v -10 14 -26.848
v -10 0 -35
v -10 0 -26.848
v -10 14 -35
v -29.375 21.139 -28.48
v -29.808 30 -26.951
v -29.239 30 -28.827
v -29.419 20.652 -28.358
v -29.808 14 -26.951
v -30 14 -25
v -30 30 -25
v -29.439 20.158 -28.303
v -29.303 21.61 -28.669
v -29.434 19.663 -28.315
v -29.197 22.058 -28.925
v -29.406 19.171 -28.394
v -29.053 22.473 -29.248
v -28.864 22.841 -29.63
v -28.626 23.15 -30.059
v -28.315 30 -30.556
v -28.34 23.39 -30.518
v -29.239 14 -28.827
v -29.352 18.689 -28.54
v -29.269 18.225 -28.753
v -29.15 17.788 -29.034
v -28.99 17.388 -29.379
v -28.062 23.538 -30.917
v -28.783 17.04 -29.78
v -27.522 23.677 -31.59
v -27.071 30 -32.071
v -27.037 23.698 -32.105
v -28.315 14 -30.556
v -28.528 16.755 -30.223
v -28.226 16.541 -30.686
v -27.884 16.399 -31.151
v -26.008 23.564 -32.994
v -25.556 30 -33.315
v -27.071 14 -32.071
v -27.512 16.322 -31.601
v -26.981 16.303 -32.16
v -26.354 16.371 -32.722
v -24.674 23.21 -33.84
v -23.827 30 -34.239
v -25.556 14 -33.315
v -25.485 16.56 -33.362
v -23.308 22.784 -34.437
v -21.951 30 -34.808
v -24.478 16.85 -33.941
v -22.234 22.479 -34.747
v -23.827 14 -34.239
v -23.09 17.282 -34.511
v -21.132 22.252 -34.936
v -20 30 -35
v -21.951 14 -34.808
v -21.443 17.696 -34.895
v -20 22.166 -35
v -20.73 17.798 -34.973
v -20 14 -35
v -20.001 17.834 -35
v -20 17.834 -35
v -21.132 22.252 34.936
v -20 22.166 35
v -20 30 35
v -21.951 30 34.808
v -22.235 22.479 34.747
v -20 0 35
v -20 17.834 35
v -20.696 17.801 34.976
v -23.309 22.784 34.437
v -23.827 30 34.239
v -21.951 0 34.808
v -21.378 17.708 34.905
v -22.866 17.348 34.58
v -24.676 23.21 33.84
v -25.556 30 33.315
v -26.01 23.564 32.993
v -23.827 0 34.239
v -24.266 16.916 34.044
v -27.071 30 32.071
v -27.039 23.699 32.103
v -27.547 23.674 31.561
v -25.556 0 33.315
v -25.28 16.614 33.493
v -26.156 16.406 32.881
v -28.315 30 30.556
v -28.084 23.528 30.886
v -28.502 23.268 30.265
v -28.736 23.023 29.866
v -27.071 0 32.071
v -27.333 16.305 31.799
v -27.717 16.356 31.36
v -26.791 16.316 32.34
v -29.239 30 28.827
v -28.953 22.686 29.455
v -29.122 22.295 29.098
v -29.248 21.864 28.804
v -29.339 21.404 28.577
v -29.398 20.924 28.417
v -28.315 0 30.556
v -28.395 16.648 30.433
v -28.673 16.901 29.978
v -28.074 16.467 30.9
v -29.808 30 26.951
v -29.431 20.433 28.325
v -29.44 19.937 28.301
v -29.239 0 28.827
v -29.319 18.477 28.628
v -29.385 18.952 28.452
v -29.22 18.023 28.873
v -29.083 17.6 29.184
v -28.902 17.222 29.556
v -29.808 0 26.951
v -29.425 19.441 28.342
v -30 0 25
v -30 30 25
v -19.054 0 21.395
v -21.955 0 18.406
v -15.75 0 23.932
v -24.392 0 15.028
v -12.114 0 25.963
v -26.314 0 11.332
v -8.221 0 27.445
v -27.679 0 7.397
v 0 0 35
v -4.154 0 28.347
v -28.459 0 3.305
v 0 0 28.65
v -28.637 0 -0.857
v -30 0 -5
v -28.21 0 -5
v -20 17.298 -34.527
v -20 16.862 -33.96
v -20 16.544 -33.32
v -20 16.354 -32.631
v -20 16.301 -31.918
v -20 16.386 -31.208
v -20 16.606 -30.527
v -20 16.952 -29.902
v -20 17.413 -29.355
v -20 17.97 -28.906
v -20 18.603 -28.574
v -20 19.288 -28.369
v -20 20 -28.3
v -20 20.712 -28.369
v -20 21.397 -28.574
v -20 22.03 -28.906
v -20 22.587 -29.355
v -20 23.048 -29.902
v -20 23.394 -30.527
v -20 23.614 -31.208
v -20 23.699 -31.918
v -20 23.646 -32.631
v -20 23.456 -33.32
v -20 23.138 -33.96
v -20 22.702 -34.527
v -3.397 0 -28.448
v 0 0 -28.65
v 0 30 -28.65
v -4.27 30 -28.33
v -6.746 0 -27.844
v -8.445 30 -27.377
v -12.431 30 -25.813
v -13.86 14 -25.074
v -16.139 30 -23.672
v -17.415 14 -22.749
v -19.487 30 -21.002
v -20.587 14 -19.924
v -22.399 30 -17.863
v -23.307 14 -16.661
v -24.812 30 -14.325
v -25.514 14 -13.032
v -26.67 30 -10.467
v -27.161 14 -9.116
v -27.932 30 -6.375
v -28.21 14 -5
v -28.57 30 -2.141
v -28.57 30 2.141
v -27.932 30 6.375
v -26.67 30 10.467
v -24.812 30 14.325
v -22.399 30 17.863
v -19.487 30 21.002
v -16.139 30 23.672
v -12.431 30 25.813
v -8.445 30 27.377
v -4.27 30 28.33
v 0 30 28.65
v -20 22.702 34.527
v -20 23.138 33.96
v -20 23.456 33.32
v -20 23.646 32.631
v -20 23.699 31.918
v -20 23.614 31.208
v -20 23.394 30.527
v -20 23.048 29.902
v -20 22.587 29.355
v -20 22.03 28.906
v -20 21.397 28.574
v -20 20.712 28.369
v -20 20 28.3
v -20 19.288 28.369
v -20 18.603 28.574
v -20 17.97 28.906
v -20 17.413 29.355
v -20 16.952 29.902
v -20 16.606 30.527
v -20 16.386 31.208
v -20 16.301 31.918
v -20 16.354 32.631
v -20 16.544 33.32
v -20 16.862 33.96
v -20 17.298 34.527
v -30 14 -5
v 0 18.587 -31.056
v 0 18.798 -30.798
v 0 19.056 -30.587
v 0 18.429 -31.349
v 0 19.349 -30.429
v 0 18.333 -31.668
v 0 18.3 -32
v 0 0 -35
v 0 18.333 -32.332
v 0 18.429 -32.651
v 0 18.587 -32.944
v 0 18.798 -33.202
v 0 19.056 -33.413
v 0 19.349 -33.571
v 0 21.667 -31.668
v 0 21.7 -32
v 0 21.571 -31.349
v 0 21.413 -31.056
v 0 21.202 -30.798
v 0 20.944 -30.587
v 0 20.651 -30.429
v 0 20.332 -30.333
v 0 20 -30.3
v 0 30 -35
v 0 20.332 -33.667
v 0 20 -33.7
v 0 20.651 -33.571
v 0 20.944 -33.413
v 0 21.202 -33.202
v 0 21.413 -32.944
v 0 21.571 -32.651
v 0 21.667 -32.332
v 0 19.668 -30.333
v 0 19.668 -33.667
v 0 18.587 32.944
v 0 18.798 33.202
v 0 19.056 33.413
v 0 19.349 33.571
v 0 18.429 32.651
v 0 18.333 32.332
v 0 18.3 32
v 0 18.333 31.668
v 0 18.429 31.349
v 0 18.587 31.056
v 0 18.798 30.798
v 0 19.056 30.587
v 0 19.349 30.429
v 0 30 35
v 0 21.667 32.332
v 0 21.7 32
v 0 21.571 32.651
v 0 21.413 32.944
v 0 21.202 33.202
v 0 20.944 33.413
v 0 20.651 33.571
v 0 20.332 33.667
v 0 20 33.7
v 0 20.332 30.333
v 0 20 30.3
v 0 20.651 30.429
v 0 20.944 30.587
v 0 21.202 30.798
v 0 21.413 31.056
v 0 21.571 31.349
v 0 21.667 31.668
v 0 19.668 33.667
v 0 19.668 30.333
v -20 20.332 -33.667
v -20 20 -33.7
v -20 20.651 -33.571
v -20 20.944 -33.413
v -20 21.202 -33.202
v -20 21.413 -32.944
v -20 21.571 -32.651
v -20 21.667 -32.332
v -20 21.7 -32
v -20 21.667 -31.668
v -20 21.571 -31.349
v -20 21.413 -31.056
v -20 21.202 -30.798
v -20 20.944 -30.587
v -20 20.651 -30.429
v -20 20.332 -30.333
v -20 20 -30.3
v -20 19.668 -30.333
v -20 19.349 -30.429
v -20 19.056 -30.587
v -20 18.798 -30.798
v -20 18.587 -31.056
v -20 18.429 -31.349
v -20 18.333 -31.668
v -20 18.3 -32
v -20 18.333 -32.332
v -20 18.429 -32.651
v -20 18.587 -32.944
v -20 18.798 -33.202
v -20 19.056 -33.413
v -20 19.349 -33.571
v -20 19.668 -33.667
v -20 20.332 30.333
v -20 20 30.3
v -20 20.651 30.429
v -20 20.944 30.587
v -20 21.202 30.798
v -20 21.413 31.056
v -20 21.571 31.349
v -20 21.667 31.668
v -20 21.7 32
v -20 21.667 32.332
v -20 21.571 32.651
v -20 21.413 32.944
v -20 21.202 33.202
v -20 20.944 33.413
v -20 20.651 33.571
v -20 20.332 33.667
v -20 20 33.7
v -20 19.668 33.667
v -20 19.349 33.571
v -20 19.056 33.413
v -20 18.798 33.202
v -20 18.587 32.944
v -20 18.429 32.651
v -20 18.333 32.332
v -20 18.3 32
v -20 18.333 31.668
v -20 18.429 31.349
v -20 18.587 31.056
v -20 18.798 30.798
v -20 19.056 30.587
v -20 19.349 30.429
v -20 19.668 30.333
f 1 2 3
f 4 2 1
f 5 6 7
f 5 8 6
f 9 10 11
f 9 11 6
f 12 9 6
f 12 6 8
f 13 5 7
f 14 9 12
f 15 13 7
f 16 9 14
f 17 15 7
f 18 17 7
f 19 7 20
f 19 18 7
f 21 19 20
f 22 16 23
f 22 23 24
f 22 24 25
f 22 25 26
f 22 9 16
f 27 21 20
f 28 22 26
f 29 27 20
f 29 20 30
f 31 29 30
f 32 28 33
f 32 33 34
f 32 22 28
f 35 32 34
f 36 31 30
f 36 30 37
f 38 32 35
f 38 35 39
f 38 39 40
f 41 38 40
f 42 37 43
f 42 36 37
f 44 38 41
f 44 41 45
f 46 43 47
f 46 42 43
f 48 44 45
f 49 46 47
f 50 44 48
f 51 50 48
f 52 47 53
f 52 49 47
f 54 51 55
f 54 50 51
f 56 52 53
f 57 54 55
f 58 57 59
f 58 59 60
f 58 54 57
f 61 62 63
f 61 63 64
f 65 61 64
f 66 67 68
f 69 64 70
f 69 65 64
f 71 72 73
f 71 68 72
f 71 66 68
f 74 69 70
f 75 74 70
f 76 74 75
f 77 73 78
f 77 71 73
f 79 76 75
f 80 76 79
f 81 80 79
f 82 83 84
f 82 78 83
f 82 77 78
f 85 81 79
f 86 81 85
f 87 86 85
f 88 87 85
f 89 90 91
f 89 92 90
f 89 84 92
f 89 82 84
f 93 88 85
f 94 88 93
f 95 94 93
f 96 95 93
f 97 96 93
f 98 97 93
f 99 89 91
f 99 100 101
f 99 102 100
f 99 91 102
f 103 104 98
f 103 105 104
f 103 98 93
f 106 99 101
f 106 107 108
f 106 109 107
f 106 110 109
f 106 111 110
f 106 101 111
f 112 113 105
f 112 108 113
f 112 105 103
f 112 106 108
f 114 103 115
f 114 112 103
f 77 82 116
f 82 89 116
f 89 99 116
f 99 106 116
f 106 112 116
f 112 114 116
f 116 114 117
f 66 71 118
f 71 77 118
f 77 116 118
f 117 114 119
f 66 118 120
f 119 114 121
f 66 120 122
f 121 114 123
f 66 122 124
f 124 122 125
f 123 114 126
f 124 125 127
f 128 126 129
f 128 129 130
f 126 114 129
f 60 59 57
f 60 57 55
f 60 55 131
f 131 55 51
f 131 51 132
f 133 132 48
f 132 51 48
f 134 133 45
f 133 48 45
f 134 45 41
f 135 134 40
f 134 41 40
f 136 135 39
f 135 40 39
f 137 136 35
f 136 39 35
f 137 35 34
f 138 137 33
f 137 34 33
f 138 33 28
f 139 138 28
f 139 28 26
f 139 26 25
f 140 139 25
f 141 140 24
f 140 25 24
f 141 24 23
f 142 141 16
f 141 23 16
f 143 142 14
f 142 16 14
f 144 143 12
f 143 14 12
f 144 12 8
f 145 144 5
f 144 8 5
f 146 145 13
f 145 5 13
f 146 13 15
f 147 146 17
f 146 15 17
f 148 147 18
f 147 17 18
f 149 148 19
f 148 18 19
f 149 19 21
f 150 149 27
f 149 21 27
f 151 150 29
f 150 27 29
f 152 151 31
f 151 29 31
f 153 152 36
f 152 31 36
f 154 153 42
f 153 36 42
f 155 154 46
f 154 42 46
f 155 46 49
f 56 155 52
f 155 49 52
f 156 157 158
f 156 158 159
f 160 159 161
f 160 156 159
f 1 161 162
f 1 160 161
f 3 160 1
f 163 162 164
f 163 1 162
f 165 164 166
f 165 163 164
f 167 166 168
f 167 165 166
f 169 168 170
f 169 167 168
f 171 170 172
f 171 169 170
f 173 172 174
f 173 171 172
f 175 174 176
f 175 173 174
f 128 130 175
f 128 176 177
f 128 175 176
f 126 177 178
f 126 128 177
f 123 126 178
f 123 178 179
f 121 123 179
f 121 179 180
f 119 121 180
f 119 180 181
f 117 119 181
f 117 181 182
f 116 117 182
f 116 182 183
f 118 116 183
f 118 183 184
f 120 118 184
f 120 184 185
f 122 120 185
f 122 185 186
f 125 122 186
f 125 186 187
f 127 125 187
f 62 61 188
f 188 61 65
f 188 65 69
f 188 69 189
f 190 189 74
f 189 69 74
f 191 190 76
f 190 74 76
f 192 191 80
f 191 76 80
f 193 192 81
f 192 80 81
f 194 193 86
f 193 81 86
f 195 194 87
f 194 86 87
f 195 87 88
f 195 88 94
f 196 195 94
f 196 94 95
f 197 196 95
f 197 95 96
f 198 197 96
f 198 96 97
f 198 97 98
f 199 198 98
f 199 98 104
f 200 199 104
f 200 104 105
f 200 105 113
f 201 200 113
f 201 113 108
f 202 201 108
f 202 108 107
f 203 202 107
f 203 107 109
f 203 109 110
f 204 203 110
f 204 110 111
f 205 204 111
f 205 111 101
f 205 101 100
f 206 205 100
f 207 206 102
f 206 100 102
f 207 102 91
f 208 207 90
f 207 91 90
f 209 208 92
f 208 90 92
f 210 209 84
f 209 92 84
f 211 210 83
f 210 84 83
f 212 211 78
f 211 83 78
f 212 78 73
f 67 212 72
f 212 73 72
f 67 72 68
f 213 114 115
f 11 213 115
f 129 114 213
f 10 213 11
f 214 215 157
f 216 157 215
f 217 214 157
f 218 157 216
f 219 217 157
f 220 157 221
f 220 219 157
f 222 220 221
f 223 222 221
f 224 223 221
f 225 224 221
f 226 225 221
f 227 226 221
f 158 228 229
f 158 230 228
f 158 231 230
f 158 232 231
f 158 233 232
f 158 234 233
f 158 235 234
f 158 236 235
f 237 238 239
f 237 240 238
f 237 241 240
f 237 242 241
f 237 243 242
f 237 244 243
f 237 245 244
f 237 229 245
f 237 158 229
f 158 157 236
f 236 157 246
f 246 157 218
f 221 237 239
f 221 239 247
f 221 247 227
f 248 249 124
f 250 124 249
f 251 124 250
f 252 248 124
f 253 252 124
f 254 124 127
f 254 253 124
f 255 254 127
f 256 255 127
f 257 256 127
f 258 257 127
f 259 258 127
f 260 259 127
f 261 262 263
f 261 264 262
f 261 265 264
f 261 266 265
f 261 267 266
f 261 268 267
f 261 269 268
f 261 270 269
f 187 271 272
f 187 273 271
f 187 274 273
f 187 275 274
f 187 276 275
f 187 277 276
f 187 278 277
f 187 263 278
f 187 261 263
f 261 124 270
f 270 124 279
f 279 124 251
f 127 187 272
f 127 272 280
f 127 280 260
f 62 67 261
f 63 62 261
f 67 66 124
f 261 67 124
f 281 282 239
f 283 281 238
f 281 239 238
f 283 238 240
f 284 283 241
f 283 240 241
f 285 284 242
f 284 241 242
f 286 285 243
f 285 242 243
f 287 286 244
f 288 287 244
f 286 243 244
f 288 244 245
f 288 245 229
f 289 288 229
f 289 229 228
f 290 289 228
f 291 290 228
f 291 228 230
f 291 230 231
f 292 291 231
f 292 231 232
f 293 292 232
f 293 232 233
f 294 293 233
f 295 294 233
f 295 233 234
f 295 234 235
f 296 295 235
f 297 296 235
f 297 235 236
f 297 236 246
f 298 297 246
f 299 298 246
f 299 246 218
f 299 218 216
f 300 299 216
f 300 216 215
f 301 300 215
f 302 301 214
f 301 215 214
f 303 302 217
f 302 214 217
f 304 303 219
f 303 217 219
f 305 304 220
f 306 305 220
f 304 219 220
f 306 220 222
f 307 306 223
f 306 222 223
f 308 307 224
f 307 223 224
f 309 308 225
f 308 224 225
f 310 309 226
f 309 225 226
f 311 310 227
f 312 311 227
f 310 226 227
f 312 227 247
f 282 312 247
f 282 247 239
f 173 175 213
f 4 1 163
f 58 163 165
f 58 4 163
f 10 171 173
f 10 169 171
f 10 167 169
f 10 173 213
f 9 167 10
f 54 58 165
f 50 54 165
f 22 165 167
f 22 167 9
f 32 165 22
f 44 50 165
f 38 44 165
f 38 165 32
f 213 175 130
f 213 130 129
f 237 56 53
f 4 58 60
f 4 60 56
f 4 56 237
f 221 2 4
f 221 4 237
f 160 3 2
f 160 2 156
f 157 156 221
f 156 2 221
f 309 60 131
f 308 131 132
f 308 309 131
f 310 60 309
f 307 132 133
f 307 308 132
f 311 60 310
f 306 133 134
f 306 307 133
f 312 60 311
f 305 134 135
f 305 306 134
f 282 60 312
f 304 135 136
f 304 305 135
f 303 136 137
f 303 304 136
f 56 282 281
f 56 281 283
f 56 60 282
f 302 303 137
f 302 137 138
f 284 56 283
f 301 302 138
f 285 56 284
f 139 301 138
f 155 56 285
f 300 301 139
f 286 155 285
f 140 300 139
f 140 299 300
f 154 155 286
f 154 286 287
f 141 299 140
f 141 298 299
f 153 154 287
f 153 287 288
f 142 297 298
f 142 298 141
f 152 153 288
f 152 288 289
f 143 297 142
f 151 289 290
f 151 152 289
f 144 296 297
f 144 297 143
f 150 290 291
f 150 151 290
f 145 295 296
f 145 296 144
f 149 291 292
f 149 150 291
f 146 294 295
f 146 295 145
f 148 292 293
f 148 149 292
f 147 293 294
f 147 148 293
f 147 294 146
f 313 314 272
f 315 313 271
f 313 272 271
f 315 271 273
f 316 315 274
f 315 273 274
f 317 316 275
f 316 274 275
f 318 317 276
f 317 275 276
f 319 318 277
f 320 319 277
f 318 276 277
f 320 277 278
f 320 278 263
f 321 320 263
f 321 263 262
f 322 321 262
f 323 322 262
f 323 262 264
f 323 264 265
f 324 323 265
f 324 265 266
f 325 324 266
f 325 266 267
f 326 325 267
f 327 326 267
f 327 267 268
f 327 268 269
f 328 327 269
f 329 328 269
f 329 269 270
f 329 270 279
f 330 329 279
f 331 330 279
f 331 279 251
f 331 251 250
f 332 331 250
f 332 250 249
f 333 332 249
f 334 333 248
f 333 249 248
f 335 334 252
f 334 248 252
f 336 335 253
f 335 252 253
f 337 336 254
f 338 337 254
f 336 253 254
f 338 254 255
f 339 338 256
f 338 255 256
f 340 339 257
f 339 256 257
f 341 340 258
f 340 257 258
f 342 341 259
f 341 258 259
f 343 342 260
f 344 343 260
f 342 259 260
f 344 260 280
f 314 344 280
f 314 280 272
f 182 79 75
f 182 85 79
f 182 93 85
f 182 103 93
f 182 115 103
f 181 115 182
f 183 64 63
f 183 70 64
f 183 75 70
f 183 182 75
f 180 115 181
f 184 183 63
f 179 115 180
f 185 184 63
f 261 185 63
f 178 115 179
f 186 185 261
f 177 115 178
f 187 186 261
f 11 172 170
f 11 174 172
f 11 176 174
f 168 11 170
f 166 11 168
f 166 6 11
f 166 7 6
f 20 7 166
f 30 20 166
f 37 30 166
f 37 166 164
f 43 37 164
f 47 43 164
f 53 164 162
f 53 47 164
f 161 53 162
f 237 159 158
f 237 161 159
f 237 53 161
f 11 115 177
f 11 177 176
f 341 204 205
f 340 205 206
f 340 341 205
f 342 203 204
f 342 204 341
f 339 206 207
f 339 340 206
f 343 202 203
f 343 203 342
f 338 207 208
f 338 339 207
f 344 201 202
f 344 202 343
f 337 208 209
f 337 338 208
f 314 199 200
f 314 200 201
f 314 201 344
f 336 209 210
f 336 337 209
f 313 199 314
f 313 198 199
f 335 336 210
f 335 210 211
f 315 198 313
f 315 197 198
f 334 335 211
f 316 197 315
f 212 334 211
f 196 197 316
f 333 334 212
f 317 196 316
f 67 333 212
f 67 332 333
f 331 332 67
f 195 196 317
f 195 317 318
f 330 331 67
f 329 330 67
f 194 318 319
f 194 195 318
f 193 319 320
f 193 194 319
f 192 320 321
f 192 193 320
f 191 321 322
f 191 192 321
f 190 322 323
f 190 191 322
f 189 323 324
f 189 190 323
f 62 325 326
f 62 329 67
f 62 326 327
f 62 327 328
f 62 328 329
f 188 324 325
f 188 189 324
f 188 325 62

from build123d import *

# Parameters (mm, degrees)
SKETCH_1_W          = 60
SKETCH_1_H          = 70
SKETCH_1_R          = 28.65
EXTRUDE_1_DEPTH     = 30
SKETCH_2_W          = 76.072381137
SKETCH_2_H          = 88.67236145
CUT_EXTRUDE_1_DEPTH = 30
SKETCH_3_R          = 1.7
CUT_EXTRUDE_2_DEPTH = 40
SKETCH_4_W          = 20
SKETCH_4_H          = 14
CUT_EXTRUDE_3_DEPTH = 30
SKETCH_5_R          = 3.7
CUT_EXTRUDE_4_DEPTH = 10
FILLET_1_DEPTH      = 30


with BuildPart() as part:
    # 草图1 → 凸台-拉伸1 (new body)
    with BuildSketch(Plane(origin=(0, 0, 0), x_dir=(1, 0, 0), z_dir=(0, 1, 0))):
        Rectangle(SKETCH_1_W, SKETCH_1_H)
        with Locations(Location((0, 0, 0), (0, 0, 270))):
            Circle(SKETCH_1_R, mode=Mode.SUBTRACT)
    extrude(amount=EXTRUDE_1_DEPTH)

    # 草图2 → 切除-拉伸1 (cut)
    with BuildSketch(Plane(origin=(0, 30, 0), x_dir=(1, 0, 0), z_dir=(0, 1, 0))):
        with Locations((38.036190569, 1.889997047)):
            Rectangle(SKETCH_2_W, SKETCH_2_H)
    extrude(amount=-CUT_EXTRUDE_1_DEPTH, mode=Mode.SUBTRACT)

    # 草图3 → 切除-拉伸2 (cut)
    with BuildSketch(Plane(origin=(0, 0, 0), x_dir=(0, 0, -1), z_dir=(1, 0, 0))):
        with Locations((32, 20)):
            Circle(SKETCH_3_R)
        with Locations((-32, 20)):
            Circle(SKETCH_3_R)
    extrude(amount=-CUT_EXTRUDE_2_DEPTH, mode=Mode.SUBTRACT)

    # 草图4 → 切除-拉伸3 (cut)
    with BuildSketch(Plane(origin=(0, 0, -35), x_dir=(-1, 0, 0), z_dir=(0, 0, -1))):
        with Locations((20, 7)):
            Rectangle(SKETCH_4_W, SKETCH_4_H)
    extrude(amount=-CUT_EXTRUDE_3_DEPTH, mode=Mode.SUBTRACT)

    # 草图5 → 切除-拉伸4 (cut)
    with BuildSketch(Plane.ZY.offset(30)):
        with Locations((-32, 20)):
            Circle(SKETCH_5_R)
        with Locations((32, 20)):
            Circle(SKETCH_5_R)
    extrude(amount=-CUT_EXTRUDE_4_DEPTH, mode=Mode.SUBTRACT)

    # 圆角1: read off the stored shape, not the designer's step
    # 圆角1 outline → 圆角1 (cut)
    with BuildSketch(Plane(origin=(0, 0, 0), x_dir=(1, 0, 0), z_dir=(0, 1, 0))):
        with BuildLine():
            Line((-30, -35), (-20, -35))
            ThreePointArc((-20, -35), (-27.071067812, -32.071067812), (-30, -25))
            Line((-30, -25), (-30, -35))
        make_face()
        with BuildLine():
            Line((-30, 35), (-30, 25))
            ThreePointArc((-30, 25), (-27.071067812, 32.071067812), (-20, 35))
            Line((-20, 35), (-30, 35))
        make_face()
    extrude(amount=FILLET_1_DEPTH, mode=Mode.SUBTRACT)


solid = part.part
